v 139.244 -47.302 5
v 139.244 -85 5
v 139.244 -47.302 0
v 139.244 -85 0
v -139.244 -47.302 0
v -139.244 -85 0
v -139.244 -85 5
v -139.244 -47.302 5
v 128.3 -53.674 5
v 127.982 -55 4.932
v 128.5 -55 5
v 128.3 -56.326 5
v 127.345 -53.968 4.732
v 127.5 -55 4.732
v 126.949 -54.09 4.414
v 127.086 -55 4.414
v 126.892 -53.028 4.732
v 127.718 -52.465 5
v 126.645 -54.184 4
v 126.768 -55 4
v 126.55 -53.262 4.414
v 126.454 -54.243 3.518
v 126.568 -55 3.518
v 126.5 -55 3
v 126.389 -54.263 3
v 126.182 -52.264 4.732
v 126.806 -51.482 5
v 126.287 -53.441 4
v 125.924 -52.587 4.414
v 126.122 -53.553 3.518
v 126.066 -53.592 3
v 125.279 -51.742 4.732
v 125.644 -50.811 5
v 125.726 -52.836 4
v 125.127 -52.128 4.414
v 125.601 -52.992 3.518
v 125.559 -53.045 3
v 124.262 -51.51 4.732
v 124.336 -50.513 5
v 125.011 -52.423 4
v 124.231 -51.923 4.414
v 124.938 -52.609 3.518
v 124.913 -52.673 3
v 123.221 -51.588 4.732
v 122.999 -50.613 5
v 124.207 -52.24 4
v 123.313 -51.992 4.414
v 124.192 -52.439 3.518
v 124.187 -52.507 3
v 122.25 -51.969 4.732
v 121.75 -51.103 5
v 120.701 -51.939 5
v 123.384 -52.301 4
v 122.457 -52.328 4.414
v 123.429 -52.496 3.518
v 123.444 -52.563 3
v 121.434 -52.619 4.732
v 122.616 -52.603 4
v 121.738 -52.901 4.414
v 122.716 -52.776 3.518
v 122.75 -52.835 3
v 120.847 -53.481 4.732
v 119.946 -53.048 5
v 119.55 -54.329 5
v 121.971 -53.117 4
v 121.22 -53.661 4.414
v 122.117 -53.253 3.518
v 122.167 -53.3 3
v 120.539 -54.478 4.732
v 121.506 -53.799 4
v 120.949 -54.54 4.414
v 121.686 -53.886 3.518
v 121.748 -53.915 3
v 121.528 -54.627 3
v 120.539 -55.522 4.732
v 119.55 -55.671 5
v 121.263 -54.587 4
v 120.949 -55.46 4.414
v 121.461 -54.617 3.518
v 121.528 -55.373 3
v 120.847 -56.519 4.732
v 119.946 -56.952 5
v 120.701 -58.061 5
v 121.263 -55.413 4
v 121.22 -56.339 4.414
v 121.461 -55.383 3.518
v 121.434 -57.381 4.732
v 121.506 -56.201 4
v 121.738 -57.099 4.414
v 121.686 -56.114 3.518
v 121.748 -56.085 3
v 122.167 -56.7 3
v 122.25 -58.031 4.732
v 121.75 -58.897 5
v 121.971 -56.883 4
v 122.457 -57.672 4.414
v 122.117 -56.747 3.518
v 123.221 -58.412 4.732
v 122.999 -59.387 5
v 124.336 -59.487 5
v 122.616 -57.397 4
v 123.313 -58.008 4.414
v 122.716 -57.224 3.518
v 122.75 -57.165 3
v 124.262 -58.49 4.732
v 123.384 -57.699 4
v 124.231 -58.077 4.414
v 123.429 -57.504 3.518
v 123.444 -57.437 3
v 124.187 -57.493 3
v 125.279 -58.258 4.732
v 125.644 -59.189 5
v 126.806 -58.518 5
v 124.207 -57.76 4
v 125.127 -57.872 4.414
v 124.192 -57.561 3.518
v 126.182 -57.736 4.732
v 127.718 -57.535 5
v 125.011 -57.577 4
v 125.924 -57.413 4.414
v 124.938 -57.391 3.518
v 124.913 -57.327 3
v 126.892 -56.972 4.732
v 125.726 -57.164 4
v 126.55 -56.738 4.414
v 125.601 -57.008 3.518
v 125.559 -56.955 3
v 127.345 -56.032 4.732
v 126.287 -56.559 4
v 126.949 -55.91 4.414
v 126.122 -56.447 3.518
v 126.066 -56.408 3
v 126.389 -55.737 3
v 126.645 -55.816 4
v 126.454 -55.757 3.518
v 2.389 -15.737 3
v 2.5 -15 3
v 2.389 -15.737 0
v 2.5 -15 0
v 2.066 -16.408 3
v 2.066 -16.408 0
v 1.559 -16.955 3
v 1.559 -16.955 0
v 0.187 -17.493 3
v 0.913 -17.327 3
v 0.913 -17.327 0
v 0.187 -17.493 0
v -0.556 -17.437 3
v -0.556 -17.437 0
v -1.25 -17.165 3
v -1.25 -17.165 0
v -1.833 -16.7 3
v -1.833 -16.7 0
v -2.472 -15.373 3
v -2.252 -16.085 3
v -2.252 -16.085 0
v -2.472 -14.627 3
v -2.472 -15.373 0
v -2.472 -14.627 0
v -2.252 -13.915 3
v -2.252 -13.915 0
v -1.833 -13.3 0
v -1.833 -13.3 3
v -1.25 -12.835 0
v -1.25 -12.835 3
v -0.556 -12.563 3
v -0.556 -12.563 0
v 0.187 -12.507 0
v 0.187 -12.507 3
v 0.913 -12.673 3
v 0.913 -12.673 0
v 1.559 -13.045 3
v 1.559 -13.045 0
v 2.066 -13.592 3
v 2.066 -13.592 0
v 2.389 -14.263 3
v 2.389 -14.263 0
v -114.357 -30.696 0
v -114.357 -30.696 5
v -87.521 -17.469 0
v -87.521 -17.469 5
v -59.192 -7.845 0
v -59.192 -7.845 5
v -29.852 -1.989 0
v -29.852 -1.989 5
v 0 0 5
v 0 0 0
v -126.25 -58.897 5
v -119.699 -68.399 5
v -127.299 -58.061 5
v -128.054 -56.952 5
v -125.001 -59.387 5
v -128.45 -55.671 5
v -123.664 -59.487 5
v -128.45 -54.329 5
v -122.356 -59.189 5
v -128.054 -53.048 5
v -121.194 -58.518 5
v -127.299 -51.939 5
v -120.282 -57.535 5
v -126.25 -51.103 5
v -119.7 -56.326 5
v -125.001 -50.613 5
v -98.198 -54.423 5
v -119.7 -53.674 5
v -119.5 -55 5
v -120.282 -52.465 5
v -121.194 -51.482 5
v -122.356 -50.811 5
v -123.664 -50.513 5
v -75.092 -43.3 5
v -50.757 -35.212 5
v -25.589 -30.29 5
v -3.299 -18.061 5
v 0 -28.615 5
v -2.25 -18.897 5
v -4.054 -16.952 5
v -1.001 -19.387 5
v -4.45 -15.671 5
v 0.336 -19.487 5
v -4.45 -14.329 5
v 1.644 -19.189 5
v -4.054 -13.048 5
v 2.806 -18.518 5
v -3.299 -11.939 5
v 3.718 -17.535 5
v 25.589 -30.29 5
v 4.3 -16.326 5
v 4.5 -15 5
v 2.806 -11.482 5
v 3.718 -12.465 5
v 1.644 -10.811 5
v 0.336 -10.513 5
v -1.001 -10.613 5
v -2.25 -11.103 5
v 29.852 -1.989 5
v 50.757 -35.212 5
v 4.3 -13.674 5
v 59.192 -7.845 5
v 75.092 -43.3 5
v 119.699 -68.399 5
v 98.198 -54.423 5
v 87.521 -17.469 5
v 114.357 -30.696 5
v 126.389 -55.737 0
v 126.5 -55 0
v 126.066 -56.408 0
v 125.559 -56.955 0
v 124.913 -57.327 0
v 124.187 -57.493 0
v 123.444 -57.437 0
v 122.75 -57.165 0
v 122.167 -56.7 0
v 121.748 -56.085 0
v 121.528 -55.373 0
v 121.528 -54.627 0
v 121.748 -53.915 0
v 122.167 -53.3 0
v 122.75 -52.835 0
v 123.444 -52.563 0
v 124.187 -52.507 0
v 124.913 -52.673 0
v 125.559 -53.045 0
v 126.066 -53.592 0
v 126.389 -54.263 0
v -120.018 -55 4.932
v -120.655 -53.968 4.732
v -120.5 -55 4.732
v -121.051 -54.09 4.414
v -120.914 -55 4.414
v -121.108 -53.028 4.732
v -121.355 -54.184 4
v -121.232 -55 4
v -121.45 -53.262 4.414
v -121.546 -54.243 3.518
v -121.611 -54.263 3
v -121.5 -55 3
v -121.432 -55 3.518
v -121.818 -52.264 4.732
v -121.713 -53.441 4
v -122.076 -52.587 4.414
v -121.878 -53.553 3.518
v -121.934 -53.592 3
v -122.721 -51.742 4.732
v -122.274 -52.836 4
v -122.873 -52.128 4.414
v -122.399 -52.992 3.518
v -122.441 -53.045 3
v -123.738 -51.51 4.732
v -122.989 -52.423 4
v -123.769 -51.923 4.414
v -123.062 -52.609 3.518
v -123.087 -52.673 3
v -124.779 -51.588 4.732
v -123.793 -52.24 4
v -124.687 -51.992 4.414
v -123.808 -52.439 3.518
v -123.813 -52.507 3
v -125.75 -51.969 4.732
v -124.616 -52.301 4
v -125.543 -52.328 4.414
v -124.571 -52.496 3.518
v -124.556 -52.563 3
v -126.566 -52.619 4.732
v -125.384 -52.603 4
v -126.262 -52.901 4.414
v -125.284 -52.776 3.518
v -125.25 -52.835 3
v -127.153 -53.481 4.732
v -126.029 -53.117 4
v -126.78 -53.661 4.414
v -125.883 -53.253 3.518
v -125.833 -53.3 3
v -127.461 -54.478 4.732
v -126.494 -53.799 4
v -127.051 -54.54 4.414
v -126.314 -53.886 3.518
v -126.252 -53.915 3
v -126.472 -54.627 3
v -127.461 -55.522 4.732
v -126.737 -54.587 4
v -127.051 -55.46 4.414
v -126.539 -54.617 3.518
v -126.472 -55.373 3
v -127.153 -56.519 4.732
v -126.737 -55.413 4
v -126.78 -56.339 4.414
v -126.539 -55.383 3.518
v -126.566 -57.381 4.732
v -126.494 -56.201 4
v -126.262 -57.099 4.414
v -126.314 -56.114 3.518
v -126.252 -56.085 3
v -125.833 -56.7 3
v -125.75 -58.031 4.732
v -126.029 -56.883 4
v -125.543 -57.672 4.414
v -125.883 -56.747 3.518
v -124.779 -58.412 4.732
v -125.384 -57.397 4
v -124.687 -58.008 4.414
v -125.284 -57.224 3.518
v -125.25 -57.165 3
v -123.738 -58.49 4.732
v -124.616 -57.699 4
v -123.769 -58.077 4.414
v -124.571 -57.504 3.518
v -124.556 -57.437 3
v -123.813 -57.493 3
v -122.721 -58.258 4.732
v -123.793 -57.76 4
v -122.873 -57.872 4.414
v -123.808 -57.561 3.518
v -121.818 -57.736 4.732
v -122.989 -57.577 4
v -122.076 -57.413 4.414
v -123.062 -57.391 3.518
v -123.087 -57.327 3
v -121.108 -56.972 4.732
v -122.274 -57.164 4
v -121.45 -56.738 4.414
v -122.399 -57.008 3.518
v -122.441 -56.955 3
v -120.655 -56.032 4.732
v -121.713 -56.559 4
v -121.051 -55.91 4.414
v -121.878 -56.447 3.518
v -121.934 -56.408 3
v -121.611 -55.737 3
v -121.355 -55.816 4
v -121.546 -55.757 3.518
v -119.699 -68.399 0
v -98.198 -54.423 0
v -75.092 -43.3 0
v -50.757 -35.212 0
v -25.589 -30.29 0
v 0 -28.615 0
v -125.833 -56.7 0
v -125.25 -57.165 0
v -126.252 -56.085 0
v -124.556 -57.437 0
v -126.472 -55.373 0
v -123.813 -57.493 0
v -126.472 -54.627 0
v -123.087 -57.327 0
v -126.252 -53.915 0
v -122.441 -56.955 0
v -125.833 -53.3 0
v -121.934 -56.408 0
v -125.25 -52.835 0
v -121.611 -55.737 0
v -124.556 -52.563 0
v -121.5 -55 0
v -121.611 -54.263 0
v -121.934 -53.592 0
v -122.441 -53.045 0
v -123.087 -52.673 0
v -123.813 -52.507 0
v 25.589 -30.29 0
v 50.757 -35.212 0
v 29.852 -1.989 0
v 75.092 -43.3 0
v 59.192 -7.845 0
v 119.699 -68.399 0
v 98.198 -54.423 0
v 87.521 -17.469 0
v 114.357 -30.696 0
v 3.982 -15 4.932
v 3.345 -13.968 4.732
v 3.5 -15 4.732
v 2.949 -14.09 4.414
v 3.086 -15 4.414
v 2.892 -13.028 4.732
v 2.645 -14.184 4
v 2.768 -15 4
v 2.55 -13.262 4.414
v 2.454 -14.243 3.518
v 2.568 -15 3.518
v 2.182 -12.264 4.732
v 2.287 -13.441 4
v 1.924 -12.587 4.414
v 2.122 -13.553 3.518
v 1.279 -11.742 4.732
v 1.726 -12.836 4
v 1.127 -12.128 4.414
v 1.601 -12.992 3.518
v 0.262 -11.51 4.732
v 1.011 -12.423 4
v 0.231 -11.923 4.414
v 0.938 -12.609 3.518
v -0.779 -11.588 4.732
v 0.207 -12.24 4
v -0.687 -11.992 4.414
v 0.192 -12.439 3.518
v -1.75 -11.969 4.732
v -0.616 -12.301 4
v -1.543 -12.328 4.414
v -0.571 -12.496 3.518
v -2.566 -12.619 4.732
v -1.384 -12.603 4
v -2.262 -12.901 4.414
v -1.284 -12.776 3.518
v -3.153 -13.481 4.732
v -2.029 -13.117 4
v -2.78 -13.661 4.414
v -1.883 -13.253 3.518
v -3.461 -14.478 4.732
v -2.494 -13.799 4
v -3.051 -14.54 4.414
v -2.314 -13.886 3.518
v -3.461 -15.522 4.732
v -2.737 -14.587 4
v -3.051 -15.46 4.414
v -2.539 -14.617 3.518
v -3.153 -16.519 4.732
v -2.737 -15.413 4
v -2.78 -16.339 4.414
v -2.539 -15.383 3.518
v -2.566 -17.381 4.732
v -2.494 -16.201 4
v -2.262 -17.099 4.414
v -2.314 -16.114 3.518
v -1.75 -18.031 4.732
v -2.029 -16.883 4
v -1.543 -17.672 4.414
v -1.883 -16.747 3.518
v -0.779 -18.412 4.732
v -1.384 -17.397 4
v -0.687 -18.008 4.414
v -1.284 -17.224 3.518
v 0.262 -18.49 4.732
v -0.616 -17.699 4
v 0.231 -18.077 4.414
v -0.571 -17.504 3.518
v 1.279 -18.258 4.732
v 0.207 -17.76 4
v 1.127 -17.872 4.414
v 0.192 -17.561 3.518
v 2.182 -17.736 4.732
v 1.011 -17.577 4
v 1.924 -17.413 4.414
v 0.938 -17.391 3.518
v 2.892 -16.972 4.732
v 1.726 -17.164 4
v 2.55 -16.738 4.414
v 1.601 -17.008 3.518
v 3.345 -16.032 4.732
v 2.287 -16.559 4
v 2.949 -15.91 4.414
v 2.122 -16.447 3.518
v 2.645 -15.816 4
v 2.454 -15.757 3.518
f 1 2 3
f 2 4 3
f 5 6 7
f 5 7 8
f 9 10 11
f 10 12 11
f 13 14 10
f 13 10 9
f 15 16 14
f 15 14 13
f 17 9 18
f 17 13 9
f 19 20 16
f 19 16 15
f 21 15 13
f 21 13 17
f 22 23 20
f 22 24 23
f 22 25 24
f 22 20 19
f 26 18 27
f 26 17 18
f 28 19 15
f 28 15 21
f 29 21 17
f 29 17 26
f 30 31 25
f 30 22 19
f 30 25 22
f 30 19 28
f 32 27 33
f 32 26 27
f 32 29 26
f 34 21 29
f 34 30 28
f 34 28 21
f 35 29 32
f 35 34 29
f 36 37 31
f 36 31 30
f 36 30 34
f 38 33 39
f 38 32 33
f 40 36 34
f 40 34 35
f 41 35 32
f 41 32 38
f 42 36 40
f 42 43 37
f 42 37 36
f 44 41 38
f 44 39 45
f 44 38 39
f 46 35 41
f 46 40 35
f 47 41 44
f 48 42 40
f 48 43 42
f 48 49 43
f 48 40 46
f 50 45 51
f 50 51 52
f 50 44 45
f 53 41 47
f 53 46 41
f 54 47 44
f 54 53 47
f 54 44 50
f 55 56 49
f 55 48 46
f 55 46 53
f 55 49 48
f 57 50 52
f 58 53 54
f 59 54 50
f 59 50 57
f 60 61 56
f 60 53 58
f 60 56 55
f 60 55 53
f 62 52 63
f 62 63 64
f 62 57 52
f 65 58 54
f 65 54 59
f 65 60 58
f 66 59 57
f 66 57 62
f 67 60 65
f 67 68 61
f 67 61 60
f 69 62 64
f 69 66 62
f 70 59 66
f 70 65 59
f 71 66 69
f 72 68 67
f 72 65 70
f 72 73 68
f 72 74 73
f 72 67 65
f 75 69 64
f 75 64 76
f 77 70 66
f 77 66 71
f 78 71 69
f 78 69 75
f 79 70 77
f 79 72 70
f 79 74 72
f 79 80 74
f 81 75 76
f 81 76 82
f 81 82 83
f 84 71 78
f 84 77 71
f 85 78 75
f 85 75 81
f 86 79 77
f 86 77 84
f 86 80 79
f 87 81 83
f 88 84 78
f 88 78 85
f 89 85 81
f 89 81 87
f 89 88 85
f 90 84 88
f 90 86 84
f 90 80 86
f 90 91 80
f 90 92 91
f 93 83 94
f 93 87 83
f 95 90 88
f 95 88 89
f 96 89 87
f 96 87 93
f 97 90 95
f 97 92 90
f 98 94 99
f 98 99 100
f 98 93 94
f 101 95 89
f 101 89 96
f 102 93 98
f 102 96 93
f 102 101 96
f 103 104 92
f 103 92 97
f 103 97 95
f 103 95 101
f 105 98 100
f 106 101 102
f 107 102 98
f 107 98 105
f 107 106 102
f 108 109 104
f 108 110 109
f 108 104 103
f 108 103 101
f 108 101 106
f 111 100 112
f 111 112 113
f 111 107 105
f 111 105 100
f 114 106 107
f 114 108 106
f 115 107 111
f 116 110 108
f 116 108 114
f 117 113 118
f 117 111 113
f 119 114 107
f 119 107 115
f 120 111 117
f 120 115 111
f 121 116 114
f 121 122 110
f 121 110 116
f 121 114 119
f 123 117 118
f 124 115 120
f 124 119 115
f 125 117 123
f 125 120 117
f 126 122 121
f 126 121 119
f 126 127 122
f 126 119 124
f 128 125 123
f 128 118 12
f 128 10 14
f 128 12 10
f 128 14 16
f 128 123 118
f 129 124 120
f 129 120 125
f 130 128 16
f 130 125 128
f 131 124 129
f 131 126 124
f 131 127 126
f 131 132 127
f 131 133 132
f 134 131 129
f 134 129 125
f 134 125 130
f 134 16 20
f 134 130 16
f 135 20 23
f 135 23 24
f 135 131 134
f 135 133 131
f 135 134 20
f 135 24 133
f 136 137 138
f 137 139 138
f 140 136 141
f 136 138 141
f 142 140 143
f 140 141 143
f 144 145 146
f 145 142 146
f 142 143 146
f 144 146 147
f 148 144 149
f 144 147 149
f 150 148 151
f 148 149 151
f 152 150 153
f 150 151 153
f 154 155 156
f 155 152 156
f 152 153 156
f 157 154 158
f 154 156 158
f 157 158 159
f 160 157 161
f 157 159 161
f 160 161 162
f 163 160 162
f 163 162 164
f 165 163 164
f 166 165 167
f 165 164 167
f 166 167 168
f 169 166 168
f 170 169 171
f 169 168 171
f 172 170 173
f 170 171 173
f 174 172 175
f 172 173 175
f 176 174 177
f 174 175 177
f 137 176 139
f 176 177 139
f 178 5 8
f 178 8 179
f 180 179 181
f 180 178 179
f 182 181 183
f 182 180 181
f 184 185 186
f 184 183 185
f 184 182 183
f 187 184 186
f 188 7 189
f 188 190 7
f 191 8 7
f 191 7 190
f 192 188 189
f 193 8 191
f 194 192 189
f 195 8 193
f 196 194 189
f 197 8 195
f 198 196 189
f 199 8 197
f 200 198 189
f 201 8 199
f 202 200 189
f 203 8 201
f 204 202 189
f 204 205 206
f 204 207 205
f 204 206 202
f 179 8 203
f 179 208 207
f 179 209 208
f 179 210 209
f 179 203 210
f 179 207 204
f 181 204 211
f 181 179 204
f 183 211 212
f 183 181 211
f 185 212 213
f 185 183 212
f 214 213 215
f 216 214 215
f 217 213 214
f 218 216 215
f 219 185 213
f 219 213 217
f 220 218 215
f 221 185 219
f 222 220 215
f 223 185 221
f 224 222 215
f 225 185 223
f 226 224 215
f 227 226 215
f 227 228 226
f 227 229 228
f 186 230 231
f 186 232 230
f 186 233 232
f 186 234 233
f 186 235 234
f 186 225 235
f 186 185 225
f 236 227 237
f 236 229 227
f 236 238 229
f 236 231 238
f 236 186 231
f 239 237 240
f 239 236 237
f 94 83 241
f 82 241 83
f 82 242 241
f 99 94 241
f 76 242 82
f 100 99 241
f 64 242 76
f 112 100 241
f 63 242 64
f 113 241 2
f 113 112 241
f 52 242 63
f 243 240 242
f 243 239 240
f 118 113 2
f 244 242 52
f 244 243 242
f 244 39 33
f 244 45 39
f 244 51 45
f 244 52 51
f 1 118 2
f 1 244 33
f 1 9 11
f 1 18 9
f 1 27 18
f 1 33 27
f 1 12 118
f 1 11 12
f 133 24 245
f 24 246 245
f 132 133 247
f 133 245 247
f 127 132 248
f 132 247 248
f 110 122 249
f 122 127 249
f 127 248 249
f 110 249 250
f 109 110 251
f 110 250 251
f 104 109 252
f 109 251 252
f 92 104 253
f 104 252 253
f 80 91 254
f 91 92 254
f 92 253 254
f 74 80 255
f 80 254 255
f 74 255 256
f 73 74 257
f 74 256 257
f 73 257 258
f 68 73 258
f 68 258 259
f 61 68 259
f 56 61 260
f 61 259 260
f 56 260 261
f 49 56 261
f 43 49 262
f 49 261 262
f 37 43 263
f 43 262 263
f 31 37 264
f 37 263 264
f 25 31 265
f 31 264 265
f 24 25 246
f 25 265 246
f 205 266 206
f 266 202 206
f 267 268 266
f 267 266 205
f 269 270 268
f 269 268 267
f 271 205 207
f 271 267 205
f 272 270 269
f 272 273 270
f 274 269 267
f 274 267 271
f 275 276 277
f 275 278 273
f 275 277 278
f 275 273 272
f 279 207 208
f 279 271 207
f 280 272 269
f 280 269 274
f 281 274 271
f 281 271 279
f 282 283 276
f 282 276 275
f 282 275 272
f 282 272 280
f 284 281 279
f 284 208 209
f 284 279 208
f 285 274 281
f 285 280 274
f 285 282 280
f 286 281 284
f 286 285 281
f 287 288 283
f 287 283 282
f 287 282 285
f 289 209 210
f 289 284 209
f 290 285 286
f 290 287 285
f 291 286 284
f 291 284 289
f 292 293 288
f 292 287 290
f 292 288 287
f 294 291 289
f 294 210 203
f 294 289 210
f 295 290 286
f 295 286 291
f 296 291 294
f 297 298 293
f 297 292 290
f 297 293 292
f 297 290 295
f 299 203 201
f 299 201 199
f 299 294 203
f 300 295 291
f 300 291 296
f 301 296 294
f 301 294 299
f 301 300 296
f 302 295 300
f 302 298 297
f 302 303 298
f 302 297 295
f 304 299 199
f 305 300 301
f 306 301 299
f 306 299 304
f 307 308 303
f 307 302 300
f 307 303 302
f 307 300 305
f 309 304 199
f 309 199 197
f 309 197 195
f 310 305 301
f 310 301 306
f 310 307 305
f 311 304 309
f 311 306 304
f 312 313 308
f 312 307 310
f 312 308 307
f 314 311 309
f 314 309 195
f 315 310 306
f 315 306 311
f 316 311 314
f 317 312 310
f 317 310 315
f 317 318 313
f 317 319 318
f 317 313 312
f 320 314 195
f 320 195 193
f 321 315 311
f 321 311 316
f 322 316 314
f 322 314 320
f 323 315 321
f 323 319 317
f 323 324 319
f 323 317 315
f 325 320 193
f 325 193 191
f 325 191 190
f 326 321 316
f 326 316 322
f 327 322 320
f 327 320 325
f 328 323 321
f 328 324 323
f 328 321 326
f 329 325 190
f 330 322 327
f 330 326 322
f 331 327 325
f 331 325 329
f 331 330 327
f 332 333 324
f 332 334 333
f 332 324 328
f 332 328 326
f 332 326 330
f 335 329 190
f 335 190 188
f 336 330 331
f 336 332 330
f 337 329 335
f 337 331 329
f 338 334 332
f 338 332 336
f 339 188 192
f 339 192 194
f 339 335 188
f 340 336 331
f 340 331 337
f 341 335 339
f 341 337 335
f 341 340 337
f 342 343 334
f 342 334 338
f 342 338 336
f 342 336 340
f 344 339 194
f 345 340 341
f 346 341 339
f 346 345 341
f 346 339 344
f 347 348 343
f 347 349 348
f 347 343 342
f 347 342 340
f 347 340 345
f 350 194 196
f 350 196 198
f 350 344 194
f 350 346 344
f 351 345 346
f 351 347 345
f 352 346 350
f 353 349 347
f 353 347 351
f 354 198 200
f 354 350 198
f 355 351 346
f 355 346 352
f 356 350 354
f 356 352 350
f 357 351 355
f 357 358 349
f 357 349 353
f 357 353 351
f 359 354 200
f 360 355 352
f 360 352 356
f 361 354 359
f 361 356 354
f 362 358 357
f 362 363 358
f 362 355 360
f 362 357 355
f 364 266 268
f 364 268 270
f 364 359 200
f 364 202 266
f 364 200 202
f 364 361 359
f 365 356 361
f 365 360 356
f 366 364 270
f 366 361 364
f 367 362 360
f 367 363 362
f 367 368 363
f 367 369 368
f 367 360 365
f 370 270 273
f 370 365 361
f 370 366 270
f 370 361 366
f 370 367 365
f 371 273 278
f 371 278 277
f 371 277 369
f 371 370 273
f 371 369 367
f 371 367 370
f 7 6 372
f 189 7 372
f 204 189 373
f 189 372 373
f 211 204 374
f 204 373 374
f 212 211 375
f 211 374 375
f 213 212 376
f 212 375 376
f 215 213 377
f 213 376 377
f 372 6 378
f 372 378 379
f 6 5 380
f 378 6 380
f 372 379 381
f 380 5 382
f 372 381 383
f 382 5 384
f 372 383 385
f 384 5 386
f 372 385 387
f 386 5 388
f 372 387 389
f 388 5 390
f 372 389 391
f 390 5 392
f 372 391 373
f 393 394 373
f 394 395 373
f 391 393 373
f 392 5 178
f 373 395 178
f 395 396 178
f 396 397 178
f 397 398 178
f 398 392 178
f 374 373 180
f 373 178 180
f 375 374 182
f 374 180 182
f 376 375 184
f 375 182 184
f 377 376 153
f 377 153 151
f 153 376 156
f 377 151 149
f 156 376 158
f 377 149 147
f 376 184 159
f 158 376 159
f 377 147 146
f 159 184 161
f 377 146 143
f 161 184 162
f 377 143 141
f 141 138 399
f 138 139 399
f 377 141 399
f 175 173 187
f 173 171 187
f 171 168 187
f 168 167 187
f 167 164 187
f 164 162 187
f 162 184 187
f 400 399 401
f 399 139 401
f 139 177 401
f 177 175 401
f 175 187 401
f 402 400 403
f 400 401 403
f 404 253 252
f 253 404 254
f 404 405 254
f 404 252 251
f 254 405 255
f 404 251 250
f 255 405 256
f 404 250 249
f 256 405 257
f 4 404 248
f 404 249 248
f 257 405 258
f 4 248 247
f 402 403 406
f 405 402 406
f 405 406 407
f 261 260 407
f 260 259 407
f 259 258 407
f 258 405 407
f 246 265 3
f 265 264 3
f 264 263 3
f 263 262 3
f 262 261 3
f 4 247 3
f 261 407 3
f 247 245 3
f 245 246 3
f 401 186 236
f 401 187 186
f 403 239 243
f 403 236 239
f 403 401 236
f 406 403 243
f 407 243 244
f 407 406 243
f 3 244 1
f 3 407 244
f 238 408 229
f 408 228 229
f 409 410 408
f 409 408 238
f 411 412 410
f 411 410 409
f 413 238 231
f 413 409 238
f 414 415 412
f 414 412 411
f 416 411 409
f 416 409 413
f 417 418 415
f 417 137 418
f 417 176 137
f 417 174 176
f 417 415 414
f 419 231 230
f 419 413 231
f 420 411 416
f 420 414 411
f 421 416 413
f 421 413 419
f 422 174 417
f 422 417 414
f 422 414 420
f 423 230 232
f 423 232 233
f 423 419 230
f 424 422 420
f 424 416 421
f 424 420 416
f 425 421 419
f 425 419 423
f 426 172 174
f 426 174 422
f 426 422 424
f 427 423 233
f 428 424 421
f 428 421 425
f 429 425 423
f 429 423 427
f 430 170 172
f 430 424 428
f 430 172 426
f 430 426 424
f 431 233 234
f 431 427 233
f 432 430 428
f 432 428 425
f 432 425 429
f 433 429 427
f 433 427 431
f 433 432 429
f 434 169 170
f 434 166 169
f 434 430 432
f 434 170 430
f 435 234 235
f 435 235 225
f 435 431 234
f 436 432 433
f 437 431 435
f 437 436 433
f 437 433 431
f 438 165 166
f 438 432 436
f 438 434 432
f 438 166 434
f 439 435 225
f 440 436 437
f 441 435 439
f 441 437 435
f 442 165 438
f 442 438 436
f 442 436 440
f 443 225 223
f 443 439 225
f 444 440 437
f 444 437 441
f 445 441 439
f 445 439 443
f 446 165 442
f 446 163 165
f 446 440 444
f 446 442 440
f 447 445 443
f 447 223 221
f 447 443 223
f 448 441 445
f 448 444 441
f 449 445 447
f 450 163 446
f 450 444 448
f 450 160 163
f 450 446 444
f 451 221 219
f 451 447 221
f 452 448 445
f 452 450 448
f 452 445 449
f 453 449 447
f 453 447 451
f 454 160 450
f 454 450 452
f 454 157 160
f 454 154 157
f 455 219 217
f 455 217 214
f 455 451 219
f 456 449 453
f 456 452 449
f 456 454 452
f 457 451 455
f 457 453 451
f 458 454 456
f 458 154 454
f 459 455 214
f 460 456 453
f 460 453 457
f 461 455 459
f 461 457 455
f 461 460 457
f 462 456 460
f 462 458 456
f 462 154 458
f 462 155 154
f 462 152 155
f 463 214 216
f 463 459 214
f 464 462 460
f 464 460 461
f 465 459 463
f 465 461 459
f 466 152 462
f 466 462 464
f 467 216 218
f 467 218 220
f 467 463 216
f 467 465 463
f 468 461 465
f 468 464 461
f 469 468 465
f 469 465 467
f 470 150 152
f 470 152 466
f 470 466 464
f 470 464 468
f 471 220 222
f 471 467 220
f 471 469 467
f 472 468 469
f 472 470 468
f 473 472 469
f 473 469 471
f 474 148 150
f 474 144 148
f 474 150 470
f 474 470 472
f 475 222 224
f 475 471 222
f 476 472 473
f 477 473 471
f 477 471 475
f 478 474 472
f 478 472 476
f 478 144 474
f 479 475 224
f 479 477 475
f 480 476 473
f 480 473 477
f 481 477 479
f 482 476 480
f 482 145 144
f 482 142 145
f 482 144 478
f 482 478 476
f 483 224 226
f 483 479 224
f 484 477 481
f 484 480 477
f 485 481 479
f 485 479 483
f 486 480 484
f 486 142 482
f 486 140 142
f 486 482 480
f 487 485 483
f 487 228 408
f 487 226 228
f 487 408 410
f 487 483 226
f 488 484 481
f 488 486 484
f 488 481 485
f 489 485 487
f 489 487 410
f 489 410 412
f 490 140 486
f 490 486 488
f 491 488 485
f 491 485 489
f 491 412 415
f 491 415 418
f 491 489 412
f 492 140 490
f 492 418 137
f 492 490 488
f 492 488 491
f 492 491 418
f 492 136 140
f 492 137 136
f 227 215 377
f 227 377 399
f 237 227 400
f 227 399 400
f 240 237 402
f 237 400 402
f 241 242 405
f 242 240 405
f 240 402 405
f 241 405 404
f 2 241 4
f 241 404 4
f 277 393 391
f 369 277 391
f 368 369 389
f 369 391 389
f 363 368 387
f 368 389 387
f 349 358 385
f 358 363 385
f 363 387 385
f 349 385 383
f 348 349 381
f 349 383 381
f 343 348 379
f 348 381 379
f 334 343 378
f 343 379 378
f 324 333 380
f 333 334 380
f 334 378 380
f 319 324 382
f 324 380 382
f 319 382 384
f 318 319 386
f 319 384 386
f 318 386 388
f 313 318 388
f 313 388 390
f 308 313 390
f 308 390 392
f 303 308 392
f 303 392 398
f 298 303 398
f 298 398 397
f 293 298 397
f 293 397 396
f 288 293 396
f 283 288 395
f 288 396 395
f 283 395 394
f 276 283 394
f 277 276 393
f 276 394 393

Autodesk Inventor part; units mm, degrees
ref_plane "YZ Plane" through (0, 0, 0) normal (1, 0, 0) x (0, 1, 0)
ref_plane "XZ Plane" through (0, 0, 0) normal (0, 1, 0) x (-1, 0, 0)
ref_plane "XY Plane" through (0, 0, 0) normal (0, 0, 1) x (1, 0, 0)
sketch "Sketch14" plane through (0, 0, 0) normal (0, 0, 1) x (1, 0, 0)
  line L0 (-139.2442, -85) -> (-139.2442, -47.3019)
  line L1 (0, 0) -> (0, -356.2475) construction
  line L2 (0, 0) -> (-146.5249, 0) construction
  circle A0 centre (0, -228.6) radius 228.6 construction
  arc A1 (0, 0) -> (-139.2442, -47.3019) centre (0.2992, -229.4806) ccw
  arc A2 (0, -28.6152) -> (-139.2442, -85) centre (0.2992, -229.4806) ccw
  line L3 (139.2442, -85) -> (139.2442, -47.3019)
  arc A3 (139.2442, -47.3019) -> (0, 0) centre (-0.2992, -229.4806) ccw
  arc A4 (139.2442, -85) -> (0, -28.6152) centre (-0.2992, -229.4806) ccw
  circle A5 centre (0, -15) radius 7.5
  circle A6 centre (-124, -55) radius 7.5
  circle A7 centre (124, -55) radius 7.5
  circle A8 centre (-124, -55) radius 2.5
  circle A9 centre (0, -15) radius 2.5
  circle A10 centre (124, -55) radius 2.5
  dimension "d152" = 139.2442
  dimension "d153" = 85
  dimension "d155" = 457.2
  dimension "d156" = 200.8656
  dimension "d159" = 15
  dimension "d160" = 15
  dimension "d161" = 15
  dimension "d162" = 55
  dimension "d163" = 124
  dimension "d164" = 5
  dimension "d165" = 5
  dimension "d166" = 5
extrude "Extrusion14" add sketch "Sketch14" along normal blind 5 contours L0 A1 A3 L3 A4 A2 | A5 | A6 | A7
fillet "Fillet2" radius 2 3 edges at (-126.5, -55, 5) (-2.5, -15, 5) (121.5, -55, 5)
properties part number "BaseCover" material "ABS Plastic"
